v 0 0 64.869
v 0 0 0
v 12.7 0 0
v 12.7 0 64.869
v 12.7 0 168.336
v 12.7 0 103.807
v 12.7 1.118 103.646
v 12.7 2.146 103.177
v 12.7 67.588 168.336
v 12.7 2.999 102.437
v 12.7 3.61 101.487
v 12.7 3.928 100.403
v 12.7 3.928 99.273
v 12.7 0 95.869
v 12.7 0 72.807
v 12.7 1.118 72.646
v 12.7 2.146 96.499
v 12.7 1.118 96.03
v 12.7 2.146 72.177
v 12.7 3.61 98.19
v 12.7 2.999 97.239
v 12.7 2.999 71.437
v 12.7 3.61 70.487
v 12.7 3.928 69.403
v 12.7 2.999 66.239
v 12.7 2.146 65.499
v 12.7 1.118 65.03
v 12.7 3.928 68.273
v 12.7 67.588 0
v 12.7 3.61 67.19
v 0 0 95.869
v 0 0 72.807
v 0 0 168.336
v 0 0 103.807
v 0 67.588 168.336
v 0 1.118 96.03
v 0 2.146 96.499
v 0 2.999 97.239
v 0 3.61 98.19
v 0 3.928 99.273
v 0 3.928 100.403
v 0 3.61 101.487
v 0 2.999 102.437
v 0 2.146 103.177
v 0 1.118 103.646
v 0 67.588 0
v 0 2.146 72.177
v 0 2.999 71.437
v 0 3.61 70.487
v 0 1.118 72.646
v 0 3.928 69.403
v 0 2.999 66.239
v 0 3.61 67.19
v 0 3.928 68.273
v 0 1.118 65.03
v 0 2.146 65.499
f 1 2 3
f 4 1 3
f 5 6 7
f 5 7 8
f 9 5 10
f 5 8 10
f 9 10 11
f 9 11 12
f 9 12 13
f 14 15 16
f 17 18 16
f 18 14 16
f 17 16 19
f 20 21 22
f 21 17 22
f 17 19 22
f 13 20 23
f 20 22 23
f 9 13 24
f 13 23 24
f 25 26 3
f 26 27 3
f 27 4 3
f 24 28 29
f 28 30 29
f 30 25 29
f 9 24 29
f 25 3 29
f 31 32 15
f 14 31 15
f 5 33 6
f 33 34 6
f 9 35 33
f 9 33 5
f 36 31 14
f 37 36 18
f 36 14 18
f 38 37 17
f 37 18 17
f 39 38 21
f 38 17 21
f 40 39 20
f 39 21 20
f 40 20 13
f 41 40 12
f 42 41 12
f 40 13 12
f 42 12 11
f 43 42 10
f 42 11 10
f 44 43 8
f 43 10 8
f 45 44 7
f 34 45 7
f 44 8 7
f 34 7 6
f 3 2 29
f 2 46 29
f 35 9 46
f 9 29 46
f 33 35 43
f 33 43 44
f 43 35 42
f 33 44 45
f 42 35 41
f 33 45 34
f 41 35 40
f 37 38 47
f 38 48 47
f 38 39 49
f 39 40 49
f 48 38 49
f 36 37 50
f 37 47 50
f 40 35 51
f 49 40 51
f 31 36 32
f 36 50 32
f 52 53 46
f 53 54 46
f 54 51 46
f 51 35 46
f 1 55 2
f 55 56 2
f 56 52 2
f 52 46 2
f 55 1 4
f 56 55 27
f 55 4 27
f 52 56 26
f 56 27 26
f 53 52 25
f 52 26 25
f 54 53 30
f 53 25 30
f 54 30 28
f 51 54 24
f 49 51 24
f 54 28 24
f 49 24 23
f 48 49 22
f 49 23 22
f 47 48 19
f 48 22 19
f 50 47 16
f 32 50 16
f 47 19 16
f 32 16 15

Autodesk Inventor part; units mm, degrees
ref_plane "YZ Plane" through (0, 0, 0) normal (1, 0, 0) x (0, 1, 0)
ref_plane "XZ Plane" through (0, 0, 0) normal (0, 1, 0) x (-1, 0, 0)
ref_plane "XY Plane" through (0, 0, 0) normal (0, 0, 1) x (1, 0, 0)
sketch "Sketch1" plane through (0, 0, 0) normal (0, 0, 1) x (1, 0, 0)
  line L0 (0, 0) -> (12.7, 0)
  line L1 (12.7, 0) -> (12.7, 67.5875)
  line L2 (12.7, 67.5875) -> (0, 67.5875)
  line L3 (0, 67.5875) -> (0, 0)
  dimension "d0" = 67.5875
  dimension "d1" = 12.7
extrude "Extrusion1" add sketch "Sketch1" along normal blind 168.3364
sketch "Sketch2" plane through (12.7, 0, 0) normal (1, 0, 0) x (0, 0, -1)
  line L0 (0, 0) -> (-168.3364, 0) projected
  line L1 (-99.8382, 5.715) -> (-99.8382, 5.715)
  line L2 (-168.3364, 67.5875) -> (-168.3364, 0) projected
  circle A0 centre (-99.8382, 0) radius 3.9688
  circle A1 centre (-68.8382, 0) radius 3.9688
  point P0 (-103.0132, 0)
  dimension "d9" = 7.9375
  dimension "d10" = 31
  dimension "d11" = 68.4982
extrude "Extrusion3" cut sketch "Sketch2" against normal through all
equation "\"d0\" = BaseSupportHeight"
equation "\"d1\" = BaseSupportThickness"
equation "\"d2\" = BaseSideLength"
equation "\"d10\" = HoleSpacing"
equation "\"BaseSupportHeight\" = 67.5875"
equation "\"BaseSupportThickness\" = 12.7"
equation "\"BaseSideLength\" = 168.336392"
equation "\"HoleSpacing\" = 31"
properties part number "Robot-Base-Support" material "Wood (Birch)"
